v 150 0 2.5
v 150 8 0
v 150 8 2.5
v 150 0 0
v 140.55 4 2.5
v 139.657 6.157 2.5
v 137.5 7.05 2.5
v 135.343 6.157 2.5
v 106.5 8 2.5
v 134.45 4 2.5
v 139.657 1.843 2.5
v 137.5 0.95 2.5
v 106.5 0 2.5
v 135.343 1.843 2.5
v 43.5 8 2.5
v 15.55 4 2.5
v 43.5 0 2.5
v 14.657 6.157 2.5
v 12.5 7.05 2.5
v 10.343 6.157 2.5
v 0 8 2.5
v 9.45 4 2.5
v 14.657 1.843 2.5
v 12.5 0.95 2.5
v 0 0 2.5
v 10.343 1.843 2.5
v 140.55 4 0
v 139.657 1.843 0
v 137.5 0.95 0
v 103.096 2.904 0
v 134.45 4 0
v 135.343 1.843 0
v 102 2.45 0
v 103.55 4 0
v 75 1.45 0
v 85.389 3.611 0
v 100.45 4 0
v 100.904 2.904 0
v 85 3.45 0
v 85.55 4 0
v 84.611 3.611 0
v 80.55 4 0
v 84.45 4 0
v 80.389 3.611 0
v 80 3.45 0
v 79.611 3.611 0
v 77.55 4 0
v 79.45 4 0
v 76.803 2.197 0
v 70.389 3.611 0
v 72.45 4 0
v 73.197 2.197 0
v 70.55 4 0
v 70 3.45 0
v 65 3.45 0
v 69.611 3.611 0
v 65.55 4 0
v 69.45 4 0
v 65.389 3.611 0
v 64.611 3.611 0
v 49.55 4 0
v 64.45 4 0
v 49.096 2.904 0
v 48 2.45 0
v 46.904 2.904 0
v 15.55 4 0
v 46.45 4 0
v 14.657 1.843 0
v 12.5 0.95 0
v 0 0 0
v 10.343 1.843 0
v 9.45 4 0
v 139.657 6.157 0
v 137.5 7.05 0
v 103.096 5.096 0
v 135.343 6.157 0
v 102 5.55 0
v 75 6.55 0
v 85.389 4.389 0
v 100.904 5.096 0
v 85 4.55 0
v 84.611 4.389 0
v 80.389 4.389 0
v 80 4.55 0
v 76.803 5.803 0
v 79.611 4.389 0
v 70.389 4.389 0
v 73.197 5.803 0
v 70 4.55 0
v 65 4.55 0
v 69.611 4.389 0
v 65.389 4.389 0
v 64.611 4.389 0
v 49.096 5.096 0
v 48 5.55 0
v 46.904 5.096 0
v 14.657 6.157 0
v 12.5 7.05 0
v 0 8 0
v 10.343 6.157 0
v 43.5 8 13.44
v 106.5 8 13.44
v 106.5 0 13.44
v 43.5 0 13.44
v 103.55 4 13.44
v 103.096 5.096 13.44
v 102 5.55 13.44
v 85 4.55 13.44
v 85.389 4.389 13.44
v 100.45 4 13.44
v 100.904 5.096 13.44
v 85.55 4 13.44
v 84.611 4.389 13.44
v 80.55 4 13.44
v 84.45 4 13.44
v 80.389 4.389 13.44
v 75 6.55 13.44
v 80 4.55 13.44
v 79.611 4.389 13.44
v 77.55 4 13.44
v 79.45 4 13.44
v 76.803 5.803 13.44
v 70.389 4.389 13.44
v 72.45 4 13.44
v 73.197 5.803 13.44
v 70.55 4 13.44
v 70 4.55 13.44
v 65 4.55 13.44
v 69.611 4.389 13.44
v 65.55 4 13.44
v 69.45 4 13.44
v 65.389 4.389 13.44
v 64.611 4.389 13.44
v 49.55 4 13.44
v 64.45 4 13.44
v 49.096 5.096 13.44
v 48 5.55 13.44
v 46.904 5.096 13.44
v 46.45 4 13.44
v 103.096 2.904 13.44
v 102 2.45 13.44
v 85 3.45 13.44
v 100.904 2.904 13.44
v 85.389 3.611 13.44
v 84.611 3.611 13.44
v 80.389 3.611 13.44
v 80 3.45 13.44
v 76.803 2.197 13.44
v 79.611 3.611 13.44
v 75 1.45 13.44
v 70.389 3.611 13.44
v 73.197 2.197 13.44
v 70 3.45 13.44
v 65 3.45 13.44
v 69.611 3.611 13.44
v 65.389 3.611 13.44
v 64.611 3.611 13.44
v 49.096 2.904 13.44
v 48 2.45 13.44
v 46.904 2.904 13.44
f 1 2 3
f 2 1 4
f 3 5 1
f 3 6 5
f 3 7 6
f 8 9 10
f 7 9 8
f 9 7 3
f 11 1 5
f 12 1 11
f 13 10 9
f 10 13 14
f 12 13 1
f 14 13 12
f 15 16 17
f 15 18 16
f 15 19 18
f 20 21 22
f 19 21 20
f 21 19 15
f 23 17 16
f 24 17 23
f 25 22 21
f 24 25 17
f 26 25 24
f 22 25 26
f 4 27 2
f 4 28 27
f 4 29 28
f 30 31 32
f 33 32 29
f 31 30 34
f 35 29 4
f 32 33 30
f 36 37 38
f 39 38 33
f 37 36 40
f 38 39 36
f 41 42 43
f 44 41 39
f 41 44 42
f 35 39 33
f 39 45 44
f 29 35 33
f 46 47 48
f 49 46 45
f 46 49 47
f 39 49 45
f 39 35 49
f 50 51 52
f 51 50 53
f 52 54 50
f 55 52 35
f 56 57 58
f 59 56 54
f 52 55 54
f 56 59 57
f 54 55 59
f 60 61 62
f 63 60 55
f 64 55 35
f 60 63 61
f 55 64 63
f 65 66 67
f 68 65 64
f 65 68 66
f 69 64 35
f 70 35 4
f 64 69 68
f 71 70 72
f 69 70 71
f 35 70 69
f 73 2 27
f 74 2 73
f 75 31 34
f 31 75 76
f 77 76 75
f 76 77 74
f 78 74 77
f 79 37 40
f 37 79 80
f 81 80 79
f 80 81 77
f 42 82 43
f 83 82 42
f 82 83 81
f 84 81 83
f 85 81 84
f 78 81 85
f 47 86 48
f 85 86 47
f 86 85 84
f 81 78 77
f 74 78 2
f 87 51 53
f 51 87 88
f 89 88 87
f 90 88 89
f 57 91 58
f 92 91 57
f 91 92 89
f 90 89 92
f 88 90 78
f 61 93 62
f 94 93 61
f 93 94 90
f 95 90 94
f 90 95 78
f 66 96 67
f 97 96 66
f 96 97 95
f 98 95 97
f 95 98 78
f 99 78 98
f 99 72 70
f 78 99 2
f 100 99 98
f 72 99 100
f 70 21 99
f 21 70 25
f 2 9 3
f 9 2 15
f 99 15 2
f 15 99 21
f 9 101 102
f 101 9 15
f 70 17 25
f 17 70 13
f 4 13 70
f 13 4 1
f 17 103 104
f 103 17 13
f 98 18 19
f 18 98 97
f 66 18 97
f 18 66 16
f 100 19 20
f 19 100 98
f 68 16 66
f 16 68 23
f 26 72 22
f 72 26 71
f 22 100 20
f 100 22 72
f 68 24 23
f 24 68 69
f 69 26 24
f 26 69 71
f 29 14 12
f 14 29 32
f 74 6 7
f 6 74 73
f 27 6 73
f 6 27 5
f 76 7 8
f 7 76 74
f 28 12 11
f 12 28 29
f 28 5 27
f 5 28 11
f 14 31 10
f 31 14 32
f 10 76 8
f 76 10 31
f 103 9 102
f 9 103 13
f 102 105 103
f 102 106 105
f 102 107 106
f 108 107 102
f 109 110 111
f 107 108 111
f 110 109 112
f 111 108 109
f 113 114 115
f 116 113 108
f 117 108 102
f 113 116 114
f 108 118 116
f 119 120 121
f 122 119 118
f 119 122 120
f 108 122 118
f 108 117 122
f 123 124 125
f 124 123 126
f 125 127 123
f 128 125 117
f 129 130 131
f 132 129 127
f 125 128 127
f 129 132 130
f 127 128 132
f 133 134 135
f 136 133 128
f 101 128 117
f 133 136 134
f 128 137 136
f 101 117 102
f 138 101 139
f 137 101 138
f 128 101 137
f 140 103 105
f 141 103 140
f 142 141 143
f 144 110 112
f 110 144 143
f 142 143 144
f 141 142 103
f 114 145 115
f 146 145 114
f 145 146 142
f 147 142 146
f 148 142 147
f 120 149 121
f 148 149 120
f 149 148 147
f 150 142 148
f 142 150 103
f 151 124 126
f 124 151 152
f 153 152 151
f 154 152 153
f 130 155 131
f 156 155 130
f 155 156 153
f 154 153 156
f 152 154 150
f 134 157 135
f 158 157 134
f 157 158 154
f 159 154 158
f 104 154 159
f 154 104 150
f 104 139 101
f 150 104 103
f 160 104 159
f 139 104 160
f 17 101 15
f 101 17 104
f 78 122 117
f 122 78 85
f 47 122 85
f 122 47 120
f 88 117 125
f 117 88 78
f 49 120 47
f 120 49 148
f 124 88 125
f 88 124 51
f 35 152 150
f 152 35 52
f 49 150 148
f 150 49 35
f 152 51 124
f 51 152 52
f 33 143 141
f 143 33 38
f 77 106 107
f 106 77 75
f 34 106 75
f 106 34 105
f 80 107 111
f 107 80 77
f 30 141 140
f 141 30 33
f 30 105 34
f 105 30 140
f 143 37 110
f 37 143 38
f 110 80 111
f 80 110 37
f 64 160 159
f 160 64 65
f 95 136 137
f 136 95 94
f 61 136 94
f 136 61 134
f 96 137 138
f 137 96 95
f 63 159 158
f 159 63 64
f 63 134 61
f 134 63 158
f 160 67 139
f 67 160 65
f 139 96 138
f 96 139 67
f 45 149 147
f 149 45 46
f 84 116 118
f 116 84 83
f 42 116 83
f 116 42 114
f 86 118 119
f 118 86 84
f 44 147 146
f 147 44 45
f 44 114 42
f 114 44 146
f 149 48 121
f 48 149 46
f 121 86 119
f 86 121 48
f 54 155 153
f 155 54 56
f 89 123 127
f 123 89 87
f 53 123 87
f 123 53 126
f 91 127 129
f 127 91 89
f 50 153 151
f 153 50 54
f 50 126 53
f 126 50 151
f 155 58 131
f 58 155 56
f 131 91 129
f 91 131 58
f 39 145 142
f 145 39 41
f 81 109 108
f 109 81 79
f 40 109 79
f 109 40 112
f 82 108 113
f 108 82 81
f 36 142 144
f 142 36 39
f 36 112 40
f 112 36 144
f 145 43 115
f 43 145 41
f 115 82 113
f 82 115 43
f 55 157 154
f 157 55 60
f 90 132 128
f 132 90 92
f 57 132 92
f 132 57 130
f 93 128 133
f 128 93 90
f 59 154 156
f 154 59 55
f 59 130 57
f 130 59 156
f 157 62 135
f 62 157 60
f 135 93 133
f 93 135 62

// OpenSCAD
// file: common/prism.scad
// https://en.wikibooks.org/wiki/OpenSCAD_User_Manual/The_OpenSCAD_Language#polyhedron
module prism(l, w, h){
   polyhedron(
           points=[[0,0,0], [l,0,0], [l,w,0], [0,w,0], [0,w,h], [l,w,h]],
           faces=[[0,1,2,3],[5,4,3,2],[0,4,5,1],[0,3,4],[5,2,1]]
           );
}
// main file
use <common/prism.scad>

fn = 8;
inner_width = 100;
rail_edge_width = 9;
rail_thickness = 25;
flange_thickness = 2.5;
width = 8;
base_length = inner_width + rail_thickness*2;
m6_radius = 6.1 / 2;
m5_radius = 5.1 / 2;
m3_radius = 3.1 / 2;
m1_radius = 1.1 / 2;
probe_length = 63;
m3_aperture_offset = 27;
m1_v_offset = 5;
m1_i_offset = 10;
pcb_depth = 1.56;
pogo_pin_length = 19 - 4;
probe_mount_height = (pogo_pin_length - pcb_depth - flange_thickness) ;
total_height = probe_mount_height + flange_thickness;

module probe_mount() {
  translate([base_length/2 - probe_length/2, 0, flange_thickness])
  cube(size = [probe_length, width, probe_mount_height]);
}

module support_base() {
  difference() {
    cube(size = [base_length, width, flange_thickness]);
    translate([rail_thickness/2, width/2, 0])
    cylinder(h = flange_thickness,
            r1 = m6_radius,
            r2 = m6_radius, $fn=fn);
    translate([inner_width + rail_thickness*1.5, width/2, 0])
    cylinder(h = flange_thickness,
            r1 = m6_radius,
            r2 = m6_radius, $fn=fn);
  }
}

module subtracted_cylinders() {
  union() {
    translate([base_length/2, width/2, 0])
    cylinder(h = total_height,
            r1 = m5_radius,
            r2 = m5_radius, $fn=fn);
    translate([base_length/2+m3_aperture_offset, width/2, 0])
    cylinder(h = total_height,
            r1 = m3_radius,
            r2 = m3_radius, $fn=fn);
    translate([base_length/2-m3_aperture_offset, width/2, 0])
    cylinder(h = total_height,
            r1 = m3_radius,
            r2 = m3_radius, $fn=fn);
    translate([base_length/2+m1_v_offset, width/2, 0])
    cylinder(h = total_height,
            r1 = m1_radius,
            r2 = m1_radius, $fn=fn);
    translate([base_length/2-m1_v_offset, width/2, 0])
    cylinder(h = total_height,
            r1 = m1_radius,
            r2 = m1_radius, $fn=fn);
    translate([base_length/2+m1_i_offset, width/2, 0])
    cylinder(h = total_height,
            r1 = m1_radius,
            r2 = m1_radius, $fn=fn);
    translate([base_length/2-m1_i_offset, width/2, 0])
    cylinder(h = total_height,
            r1 = m1_radius,
            r2 = m1_radius, $fn=fn);
  }
}

module render() {
  difference() {
    union() {
      support_base();
      probe_mount();
    }
  subtracted_cylinders();
  }
}

echo(version=version());

render();
